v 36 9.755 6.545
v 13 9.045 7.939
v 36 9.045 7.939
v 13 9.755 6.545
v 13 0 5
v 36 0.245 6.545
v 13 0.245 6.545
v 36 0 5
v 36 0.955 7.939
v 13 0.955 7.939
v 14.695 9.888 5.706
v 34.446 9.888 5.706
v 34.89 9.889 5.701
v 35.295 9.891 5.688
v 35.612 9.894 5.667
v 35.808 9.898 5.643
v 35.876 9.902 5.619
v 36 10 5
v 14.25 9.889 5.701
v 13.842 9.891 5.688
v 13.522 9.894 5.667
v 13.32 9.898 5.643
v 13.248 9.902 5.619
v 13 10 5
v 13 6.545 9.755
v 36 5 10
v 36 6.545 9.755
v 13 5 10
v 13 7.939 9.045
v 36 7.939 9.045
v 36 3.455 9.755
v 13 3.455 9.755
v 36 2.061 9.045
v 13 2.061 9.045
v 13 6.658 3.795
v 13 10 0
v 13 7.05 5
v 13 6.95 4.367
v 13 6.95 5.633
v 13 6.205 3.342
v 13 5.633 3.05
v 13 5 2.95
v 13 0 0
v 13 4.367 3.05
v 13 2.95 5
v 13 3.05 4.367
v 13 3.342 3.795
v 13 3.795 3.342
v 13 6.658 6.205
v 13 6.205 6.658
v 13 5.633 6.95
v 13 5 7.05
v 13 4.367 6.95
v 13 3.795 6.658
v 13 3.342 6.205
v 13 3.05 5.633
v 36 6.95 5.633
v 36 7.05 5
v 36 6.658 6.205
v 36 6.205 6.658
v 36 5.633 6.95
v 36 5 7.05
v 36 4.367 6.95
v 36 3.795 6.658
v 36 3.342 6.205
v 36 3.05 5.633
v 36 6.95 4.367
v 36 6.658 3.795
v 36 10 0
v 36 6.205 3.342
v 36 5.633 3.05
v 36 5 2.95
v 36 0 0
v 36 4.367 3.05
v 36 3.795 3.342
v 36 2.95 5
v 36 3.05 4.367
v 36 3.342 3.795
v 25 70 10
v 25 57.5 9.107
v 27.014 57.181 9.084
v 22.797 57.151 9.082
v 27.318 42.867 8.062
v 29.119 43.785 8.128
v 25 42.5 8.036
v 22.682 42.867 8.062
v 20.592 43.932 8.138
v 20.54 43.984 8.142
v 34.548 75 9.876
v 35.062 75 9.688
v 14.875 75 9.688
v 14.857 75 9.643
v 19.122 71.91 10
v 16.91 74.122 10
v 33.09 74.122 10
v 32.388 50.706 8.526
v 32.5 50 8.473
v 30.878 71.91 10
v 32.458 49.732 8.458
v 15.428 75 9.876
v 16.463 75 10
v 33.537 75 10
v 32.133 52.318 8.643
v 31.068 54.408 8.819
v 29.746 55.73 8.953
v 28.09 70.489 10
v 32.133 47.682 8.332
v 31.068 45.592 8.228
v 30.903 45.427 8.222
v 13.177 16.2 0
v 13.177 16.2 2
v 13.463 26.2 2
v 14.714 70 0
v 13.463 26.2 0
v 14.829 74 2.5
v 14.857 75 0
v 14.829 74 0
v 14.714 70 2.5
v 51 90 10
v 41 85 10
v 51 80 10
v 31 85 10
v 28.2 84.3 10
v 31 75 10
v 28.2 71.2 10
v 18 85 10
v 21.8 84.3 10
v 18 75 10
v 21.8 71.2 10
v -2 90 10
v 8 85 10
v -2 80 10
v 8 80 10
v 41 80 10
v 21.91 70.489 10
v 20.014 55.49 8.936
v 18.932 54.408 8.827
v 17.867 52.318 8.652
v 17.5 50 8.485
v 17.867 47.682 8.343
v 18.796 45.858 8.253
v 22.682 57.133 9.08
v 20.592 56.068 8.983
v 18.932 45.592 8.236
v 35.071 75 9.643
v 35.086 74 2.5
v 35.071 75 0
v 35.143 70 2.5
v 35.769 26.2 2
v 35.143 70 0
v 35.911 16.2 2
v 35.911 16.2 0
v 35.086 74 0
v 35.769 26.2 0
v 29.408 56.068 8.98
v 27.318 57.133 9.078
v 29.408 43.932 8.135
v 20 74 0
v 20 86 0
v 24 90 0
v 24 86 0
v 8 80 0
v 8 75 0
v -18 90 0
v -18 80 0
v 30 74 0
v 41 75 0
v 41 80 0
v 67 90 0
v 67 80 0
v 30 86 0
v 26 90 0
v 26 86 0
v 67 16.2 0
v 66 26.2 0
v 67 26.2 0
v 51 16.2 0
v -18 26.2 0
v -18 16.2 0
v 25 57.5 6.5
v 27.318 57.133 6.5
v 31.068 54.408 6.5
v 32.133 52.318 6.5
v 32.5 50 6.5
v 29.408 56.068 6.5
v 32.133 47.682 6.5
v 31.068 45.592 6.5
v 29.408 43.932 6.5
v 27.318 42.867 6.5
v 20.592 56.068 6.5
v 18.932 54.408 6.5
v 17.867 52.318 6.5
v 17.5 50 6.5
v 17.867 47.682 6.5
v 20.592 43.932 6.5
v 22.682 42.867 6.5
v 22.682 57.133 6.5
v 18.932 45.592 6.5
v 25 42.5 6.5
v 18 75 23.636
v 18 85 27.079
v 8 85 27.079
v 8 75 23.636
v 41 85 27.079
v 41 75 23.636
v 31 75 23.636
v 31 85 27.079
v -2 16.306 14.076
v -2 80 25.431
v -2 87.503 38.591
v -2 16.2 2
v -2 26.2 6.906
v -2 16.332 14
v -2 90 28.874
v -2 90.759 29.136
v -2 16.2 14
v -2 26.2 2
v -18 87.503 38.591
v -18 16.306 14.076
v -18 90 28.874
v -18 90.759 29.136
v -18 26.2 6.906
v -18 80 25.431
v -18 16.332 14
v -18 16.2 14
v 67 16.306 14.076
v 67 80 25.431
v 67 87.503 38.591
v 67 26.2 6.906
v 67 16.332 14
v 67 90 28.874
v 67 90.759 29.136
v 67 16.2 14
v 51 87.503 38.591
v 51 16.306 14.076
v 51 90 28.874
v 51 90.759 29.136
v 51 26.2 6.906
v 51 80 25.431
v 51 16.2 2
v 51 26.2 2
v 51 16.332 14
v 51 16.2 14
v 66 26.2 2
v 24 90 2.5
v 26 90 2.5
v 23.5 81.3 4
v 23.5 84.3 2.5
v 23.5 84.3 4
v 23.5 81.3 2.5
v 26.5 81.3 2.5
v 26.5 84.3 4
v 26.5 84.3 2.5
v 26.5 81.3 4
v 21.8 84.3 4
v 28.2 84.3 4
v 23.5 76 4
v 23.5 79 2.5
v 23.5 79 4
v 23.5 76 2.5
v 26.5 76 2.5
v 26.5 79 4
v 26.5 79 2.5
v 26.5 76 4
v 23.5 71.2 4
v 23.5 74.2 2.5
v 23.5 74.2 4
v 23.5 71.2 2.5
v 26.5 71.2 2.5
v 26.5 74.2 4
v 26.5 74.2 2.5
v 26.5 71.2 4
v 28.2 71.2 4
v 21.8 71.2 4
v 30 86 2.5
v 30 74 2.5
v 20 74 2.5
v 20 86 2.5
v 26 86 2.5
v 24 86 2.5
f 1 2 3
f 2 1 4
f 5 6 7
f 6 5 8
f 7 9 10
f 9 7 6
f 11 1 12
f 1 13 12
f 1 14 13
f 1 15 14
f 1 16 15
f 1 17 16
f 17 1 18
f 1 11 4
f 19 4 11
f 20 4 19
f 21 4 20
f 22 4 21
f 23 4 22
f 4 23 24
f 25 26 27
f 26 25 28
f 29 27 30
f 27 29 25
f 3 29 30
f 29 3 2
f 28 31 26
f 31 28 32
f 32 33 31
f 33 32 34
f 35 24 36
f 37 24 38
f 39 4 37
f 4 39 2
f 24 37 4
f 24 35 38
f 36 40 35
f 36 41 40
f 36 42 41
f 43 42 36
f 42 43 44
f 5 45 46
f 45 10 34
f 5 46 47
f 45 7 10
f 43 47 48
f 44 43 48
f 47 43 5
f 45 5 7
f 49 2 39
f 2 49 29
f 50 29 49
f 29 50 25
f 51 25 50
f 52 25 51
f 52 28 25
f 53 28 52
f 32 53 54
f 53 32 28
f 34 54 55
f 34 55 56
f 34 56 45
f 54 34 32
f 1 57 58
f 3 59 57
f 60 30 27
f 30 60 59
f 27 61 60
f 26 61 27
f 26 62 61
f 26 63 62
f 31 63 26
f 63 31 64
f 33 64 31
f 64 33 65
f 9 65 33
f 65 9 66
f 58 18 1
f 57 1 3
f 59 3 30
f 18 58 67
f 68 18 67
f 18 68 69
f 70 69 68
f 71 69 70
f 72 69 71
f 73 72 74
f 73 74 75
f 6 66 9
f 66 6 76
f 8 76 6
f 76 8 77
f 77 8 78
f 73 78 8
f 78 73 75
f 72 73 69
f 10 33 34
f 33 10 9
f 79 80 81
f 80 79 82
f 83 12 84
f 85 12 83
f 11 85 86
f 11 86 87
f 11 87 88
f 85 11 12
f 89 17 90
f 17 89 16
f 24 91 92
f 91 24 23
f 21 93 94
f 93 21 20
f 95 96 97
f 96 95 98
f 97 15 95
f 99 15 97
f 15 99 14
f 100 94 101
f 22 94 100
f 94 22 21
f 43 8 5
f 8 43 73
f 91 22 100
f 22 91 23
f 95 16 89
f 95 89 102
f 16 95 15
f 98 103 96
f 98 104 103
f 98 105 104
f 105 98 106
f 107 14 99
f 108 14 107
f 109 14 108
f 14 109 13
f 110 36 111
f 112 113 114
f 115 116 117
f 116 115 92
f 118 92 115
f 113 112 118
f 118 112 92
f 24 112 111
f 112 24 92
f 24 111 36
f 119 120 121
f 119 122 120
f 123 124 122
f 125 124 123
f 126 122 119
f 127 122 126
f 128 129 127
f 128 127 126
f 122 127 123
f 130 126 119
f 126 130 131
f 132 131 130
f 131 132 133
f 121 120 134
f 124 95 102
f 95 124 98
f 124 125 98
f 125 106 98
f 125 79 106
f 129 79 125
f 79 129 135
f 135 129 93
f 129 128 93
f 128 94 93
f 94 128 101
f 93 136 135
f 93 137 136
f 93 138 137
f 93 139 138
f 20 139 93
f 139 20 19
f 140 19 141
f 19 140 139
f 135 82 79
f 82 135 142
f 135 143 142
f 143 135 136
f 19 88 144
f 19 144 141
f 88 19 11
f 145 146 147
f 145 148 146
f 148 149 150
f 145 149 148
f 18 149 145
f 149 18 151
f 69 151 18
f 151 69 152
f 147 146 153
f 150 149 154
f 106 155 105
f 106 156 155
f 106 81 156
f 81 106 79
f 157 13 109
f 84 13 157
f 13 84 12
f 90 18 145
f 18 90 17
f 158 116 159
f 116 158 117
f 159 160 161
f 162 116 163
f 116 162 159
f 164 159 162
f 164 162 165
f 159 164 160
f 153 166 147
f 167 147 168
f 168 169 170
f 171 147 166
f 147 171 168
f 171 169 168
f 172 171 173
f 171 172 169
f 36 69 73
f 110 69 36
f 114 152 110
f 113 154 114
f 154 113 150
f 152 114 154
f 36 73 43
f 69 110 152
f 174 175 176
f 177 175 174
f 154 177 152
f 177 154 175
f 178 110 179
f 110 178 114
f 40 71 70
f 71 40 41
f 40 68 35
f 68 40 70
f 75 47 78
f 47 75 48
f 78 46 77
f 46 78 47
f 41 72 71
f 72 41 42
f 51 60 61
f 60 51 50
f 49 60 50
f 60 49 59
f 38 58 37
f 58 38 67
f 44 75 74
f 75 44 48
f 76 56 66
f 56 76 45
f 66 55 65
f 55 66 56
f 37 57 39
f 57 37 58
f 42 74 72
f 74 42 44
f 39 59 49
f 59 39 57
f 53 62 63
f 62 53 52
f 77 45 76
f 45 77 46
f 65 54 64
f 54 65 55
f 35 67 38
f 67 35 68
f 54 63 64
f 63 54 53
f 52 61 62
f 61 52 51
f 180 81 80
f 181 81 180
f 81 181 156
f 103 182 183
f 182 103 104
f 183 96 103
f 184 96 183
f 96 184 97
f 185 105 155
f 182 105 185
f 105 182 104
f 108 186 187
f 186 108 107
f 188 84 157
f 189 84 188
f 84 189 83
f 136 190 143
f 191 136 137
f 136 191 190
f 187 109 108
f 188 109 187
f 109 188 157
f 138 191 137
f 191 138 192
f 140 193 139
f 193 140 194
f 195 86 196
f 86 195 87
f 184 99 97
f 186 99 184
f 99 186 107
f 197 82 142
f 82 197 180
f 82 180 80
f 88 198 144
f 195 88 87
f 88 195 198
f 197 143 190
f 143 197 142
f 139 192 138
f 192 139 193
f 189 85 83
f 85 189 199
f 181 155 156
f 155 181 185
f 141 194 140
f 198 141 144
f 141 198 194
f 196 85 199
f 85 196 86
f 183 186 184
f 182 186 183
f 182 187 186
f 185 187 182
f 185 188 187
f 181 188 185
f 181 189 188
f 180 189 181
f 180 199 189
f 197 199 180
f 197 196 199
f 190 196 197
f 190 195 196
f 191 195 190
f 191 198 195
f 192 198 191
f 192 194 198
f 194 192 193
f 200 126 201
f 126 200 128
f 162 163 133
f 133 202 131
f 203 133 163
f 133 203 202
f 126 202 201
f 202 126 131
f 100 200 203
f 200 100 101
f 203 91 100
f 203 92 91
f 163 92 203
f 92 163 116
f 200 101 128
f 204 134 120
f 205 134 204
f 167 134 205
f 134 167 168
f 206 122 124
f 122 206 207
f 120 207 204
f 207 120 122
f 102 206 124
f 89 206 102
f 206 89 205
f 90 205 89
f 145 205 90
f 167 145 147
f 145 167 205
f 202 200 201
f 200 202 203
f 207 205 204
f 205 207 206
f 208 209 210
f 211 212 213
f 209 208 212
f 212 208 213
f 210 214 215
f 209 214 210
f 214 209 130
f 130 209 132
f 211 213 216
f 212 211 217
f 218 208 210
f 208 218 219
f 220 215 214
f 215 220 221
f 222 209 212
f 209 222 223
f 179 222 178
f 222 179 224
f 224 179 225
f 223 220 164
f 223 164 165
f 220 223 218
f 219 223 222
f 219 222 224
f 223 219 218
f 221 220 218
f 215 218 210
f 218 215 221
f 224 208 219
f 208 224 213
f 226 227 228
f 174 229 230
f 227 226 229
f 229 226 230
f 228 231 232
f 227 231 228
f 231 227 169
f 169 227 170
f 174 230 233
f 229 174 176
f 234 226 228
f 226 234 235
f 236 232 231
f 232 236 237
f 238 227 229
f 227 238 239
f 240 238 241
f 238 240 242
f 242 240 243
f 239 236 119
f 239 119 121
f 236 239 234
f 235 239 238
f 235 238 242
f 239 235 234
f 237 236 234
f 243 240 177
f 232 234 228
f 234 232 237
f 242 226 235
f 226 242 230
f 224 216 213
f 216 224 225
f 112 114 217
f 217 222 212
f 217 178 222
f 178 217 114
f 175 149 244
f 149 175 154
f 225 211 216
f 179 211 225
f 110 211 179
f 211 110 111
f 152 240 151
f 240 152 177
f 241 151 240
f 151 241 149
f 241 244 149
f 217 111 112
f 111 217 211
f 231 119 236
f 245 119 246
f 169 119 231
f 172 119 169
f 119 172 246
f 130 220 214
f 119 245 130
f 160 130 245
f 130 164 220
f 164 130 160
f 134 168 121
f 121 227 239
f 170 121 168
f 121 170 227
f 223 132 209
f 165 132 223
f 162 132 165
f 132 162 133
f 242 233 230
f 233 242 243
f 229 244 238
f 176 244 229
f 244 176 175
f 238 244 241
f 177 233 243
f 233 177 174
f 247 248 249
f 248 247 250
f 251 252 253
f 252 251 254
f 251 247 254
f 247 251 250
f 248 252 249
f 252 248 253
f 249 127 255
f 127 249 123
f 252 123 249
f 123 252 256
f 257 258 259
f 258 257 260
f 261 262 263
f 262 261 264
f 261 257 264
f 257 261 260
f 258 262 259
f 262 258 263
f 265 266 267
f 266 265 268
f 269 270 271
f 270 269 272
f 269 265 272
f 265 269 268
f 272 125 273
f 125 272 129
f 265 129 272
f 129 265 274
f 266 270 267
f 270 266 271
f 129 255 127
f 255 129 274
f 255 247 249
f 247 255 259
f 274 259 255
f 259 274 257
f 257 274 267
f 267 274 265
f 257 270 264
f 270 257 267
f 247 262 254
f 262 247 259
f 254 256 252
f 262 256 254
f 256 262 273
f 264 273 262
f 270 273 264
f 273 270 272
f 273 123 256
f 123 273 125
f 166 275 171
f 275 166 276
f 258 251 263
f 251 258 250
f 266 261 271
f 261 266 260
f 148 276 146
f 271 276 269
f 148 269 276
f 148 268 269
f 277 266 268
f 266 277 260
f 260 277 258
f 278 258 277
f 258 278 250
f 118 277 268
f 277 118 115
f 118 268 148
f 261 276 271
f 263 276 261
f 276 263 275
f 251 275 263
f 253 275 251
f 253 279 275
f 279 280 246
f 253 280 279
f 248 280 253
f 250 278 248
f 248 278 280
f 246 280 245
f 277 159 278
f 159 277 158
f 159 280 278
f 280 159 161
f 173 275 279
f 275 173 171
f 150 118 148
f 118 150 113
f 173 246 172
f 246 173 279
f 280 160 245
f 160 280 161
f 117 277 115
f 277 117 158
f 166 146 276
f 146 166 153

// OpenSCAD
$fn = 20;

width=50;
length=100;

outerwall=10;

screw_front_lenght=13;
screw_head_length = 3.5;
screw_head_diameter=7.8;
screw_inner_diameter=3;
screw_thread_diameter=4.1;
screw_thread_depth = 0.4;
paddle_corner_radius=10;

springhole_diameter = 15;

pressblob_diameter=10;

sidemount_width=17;

mount_angle = 19.0;
/*
  TODO proper wire management
*/

module paddle_top() {
	difference() {
		hull() {
			translate([paddle_corner_radius, length-paddle_corner_radius])
			cylinder(r=paddle_corner_radius, h=outerwall);

			translate([width-paddle_corner_radius, length-paddle_corner_radius])
			cylinder(r=paddle_corner_radius, h=outerwall);

			translate([0,outerwall/2,outerwall/2])
			rotate([0,90,0])
			cylinder(d=outerwall, h=width);
		}
		// Screw hole
		translate([-1, outerwall/2, outerwall/2])
		rotate([0, 90, 0]) {
			cylinder(h=width+2, d=screw_thread_diameter);
			translate([0, 0, 1])
			#cylinder(d1=screw_head_diameter, d2=screw_thread_diameter, h=screw_head_length);
			translate([0, 0, width-screw_head_length+1])
			#cylinder(d1=screw_thread_diameter, d2=screw_head_diameter, h=screw_head_length);
		}


		// cubic hole
		translate([screw_front_lenght,-1,0]) {
		cube([width-screw_front_lenght*2,outerwall+3, outerwall+1]);

		// Diagonal spacing
		translate([0,0,-4])
		rotate([-13,0,0])
		cube([width-screw_front_lenght*2,outerwall*10, outerwall]);
		}

		// Springhole
		translate([width/2, length/2])
		cylinder(d=springhole_diameter, h=outerwall/2, center=true);

	}

	// pressblob
	hull(){
		translate([width/2,length*0.83, 0]) {
			translate([0,0,pressblob_diameter/2])
			cylinder(d=pressblob_diameter, h=0.1, center=true);
			rotate([0,90,0])
			cylinder(d=pressblob_diameter, h=pressblob_diameter, center=true);
		}
	}

}

module taster() {
	translate([-3.2, -4.3, -16]){
		cube([6.4,13.1,12]);
	}
	translate([0,0,-4]) {
		cylinder(d=6.3,h=4);
		cylinder(d=2.4, h=6.6);
	}

	translate([0,0,-12]) {
		translate([0,-2.8,-5])
		cube([3,3,3], center=true);
		translate([0,2.5,-5])
		cube([3,3,3], center=true);
		translate([0,7.3,-5])
		cube([3,3,3], center=true);
	}
}

module paddle_base() {
	difference () { union() {
		difference() {
			translate([screw_front_lenght,0,0]) {

				translate([0, outerwall/2, outerwall/2])
				rotate([0, 90, 0])
				cylinder(d=outerwall, h=width-screw_front_lenght*2-1);

				//cube([width-screw_front_lenght*2-1, outerwall, outerwall]);
				hull() {
					cube([width-screw_front_lenght*2-1,outerwall, outerwall/2]);
					translate([(width-screw_front_lenght*2)/2,length*4/5,0])
					cylinder(d=20,h=outerwall);
				}
			}
			// Screw hole
			translate([-1, outerwall/2, outerwall/2])
			rotate([0, 90, 0])
			cylinder(h=width+2, d=screw_thread_diameter);

			// springhole
			translate([width/2, length/2, outerwall-1])
			cylinder(d=springhole_diameter, h=outerwall/2, center=true);
		}

		difference() {
		// support max depth
			union() {
				translate([(width-screw_front_lenght*2)/2 - 4,length*4/5 -5,0]) {
					cube([10, 10, 35]);
				}
				translate([(width-screw_front_lenght*2)/2 + 19,length*4/5 -5,0]) {
					cube([10, 10, 35]);
				}
			}

			translate([-0.5,2,-1.5])
			rotate([down,0,0])
			cube([width, length, outerwall * 2]);
		}


		//diagonal holding stuff
		translate([-sidemount_width-1, 0, 0]) {
			rotate([mount_angle,0,0]) {
				translate([0,20,-2])
				cube([sidemount_width-1, length-24.7, outerwall]);

				translate([width+sidemount_width+2,20,-2])
				cube([sidemount_width-1, length-24.7, outerwall]);
			}
			translate([0,16.2,0]) {
				cube([sidemount_width-1, 10, 14.0]);
				cube([width + sidemount_width * 2, 10, 2]);
			}

			translate([width+sidemount_width+2,16.2,0]) {
				cube([sidemount_width-1, 10, 14.0]);
			}
			//support diagonal
			translate([0, length-20, 0]) {
				// side A
				cube([width+sidemount_width*2, 10, outerwall]);
				translate([0, 0, 0])
				cube([sidemount_width-1, 10, 29]);
				translate([width+sidemount_width+2, 0, 0])
				cube([sidemount_width-1, 10, 29]);
			}
		}
	}

	// Taster hole

		// Wireing
		translate([width/2,length*4/5, 0]) {
			translate([0, 0, 20]) {
				rotate([0,0,180])
				#taster();
			}
			translate([0,-2,1])
			cube([10,16,3], center=true);

			translate([0, 10, 1])
			cube([2,30,3], center=true);

			translate([0, -8, 1])
			cube([30,4,3], center=true);
		}
	}
}

up = 20.5;
down=19;

translate([-0.5,2,-1.5])
rotate([down,0,0])
color([0,1,0])
paddle_top();
!paddle_base();
